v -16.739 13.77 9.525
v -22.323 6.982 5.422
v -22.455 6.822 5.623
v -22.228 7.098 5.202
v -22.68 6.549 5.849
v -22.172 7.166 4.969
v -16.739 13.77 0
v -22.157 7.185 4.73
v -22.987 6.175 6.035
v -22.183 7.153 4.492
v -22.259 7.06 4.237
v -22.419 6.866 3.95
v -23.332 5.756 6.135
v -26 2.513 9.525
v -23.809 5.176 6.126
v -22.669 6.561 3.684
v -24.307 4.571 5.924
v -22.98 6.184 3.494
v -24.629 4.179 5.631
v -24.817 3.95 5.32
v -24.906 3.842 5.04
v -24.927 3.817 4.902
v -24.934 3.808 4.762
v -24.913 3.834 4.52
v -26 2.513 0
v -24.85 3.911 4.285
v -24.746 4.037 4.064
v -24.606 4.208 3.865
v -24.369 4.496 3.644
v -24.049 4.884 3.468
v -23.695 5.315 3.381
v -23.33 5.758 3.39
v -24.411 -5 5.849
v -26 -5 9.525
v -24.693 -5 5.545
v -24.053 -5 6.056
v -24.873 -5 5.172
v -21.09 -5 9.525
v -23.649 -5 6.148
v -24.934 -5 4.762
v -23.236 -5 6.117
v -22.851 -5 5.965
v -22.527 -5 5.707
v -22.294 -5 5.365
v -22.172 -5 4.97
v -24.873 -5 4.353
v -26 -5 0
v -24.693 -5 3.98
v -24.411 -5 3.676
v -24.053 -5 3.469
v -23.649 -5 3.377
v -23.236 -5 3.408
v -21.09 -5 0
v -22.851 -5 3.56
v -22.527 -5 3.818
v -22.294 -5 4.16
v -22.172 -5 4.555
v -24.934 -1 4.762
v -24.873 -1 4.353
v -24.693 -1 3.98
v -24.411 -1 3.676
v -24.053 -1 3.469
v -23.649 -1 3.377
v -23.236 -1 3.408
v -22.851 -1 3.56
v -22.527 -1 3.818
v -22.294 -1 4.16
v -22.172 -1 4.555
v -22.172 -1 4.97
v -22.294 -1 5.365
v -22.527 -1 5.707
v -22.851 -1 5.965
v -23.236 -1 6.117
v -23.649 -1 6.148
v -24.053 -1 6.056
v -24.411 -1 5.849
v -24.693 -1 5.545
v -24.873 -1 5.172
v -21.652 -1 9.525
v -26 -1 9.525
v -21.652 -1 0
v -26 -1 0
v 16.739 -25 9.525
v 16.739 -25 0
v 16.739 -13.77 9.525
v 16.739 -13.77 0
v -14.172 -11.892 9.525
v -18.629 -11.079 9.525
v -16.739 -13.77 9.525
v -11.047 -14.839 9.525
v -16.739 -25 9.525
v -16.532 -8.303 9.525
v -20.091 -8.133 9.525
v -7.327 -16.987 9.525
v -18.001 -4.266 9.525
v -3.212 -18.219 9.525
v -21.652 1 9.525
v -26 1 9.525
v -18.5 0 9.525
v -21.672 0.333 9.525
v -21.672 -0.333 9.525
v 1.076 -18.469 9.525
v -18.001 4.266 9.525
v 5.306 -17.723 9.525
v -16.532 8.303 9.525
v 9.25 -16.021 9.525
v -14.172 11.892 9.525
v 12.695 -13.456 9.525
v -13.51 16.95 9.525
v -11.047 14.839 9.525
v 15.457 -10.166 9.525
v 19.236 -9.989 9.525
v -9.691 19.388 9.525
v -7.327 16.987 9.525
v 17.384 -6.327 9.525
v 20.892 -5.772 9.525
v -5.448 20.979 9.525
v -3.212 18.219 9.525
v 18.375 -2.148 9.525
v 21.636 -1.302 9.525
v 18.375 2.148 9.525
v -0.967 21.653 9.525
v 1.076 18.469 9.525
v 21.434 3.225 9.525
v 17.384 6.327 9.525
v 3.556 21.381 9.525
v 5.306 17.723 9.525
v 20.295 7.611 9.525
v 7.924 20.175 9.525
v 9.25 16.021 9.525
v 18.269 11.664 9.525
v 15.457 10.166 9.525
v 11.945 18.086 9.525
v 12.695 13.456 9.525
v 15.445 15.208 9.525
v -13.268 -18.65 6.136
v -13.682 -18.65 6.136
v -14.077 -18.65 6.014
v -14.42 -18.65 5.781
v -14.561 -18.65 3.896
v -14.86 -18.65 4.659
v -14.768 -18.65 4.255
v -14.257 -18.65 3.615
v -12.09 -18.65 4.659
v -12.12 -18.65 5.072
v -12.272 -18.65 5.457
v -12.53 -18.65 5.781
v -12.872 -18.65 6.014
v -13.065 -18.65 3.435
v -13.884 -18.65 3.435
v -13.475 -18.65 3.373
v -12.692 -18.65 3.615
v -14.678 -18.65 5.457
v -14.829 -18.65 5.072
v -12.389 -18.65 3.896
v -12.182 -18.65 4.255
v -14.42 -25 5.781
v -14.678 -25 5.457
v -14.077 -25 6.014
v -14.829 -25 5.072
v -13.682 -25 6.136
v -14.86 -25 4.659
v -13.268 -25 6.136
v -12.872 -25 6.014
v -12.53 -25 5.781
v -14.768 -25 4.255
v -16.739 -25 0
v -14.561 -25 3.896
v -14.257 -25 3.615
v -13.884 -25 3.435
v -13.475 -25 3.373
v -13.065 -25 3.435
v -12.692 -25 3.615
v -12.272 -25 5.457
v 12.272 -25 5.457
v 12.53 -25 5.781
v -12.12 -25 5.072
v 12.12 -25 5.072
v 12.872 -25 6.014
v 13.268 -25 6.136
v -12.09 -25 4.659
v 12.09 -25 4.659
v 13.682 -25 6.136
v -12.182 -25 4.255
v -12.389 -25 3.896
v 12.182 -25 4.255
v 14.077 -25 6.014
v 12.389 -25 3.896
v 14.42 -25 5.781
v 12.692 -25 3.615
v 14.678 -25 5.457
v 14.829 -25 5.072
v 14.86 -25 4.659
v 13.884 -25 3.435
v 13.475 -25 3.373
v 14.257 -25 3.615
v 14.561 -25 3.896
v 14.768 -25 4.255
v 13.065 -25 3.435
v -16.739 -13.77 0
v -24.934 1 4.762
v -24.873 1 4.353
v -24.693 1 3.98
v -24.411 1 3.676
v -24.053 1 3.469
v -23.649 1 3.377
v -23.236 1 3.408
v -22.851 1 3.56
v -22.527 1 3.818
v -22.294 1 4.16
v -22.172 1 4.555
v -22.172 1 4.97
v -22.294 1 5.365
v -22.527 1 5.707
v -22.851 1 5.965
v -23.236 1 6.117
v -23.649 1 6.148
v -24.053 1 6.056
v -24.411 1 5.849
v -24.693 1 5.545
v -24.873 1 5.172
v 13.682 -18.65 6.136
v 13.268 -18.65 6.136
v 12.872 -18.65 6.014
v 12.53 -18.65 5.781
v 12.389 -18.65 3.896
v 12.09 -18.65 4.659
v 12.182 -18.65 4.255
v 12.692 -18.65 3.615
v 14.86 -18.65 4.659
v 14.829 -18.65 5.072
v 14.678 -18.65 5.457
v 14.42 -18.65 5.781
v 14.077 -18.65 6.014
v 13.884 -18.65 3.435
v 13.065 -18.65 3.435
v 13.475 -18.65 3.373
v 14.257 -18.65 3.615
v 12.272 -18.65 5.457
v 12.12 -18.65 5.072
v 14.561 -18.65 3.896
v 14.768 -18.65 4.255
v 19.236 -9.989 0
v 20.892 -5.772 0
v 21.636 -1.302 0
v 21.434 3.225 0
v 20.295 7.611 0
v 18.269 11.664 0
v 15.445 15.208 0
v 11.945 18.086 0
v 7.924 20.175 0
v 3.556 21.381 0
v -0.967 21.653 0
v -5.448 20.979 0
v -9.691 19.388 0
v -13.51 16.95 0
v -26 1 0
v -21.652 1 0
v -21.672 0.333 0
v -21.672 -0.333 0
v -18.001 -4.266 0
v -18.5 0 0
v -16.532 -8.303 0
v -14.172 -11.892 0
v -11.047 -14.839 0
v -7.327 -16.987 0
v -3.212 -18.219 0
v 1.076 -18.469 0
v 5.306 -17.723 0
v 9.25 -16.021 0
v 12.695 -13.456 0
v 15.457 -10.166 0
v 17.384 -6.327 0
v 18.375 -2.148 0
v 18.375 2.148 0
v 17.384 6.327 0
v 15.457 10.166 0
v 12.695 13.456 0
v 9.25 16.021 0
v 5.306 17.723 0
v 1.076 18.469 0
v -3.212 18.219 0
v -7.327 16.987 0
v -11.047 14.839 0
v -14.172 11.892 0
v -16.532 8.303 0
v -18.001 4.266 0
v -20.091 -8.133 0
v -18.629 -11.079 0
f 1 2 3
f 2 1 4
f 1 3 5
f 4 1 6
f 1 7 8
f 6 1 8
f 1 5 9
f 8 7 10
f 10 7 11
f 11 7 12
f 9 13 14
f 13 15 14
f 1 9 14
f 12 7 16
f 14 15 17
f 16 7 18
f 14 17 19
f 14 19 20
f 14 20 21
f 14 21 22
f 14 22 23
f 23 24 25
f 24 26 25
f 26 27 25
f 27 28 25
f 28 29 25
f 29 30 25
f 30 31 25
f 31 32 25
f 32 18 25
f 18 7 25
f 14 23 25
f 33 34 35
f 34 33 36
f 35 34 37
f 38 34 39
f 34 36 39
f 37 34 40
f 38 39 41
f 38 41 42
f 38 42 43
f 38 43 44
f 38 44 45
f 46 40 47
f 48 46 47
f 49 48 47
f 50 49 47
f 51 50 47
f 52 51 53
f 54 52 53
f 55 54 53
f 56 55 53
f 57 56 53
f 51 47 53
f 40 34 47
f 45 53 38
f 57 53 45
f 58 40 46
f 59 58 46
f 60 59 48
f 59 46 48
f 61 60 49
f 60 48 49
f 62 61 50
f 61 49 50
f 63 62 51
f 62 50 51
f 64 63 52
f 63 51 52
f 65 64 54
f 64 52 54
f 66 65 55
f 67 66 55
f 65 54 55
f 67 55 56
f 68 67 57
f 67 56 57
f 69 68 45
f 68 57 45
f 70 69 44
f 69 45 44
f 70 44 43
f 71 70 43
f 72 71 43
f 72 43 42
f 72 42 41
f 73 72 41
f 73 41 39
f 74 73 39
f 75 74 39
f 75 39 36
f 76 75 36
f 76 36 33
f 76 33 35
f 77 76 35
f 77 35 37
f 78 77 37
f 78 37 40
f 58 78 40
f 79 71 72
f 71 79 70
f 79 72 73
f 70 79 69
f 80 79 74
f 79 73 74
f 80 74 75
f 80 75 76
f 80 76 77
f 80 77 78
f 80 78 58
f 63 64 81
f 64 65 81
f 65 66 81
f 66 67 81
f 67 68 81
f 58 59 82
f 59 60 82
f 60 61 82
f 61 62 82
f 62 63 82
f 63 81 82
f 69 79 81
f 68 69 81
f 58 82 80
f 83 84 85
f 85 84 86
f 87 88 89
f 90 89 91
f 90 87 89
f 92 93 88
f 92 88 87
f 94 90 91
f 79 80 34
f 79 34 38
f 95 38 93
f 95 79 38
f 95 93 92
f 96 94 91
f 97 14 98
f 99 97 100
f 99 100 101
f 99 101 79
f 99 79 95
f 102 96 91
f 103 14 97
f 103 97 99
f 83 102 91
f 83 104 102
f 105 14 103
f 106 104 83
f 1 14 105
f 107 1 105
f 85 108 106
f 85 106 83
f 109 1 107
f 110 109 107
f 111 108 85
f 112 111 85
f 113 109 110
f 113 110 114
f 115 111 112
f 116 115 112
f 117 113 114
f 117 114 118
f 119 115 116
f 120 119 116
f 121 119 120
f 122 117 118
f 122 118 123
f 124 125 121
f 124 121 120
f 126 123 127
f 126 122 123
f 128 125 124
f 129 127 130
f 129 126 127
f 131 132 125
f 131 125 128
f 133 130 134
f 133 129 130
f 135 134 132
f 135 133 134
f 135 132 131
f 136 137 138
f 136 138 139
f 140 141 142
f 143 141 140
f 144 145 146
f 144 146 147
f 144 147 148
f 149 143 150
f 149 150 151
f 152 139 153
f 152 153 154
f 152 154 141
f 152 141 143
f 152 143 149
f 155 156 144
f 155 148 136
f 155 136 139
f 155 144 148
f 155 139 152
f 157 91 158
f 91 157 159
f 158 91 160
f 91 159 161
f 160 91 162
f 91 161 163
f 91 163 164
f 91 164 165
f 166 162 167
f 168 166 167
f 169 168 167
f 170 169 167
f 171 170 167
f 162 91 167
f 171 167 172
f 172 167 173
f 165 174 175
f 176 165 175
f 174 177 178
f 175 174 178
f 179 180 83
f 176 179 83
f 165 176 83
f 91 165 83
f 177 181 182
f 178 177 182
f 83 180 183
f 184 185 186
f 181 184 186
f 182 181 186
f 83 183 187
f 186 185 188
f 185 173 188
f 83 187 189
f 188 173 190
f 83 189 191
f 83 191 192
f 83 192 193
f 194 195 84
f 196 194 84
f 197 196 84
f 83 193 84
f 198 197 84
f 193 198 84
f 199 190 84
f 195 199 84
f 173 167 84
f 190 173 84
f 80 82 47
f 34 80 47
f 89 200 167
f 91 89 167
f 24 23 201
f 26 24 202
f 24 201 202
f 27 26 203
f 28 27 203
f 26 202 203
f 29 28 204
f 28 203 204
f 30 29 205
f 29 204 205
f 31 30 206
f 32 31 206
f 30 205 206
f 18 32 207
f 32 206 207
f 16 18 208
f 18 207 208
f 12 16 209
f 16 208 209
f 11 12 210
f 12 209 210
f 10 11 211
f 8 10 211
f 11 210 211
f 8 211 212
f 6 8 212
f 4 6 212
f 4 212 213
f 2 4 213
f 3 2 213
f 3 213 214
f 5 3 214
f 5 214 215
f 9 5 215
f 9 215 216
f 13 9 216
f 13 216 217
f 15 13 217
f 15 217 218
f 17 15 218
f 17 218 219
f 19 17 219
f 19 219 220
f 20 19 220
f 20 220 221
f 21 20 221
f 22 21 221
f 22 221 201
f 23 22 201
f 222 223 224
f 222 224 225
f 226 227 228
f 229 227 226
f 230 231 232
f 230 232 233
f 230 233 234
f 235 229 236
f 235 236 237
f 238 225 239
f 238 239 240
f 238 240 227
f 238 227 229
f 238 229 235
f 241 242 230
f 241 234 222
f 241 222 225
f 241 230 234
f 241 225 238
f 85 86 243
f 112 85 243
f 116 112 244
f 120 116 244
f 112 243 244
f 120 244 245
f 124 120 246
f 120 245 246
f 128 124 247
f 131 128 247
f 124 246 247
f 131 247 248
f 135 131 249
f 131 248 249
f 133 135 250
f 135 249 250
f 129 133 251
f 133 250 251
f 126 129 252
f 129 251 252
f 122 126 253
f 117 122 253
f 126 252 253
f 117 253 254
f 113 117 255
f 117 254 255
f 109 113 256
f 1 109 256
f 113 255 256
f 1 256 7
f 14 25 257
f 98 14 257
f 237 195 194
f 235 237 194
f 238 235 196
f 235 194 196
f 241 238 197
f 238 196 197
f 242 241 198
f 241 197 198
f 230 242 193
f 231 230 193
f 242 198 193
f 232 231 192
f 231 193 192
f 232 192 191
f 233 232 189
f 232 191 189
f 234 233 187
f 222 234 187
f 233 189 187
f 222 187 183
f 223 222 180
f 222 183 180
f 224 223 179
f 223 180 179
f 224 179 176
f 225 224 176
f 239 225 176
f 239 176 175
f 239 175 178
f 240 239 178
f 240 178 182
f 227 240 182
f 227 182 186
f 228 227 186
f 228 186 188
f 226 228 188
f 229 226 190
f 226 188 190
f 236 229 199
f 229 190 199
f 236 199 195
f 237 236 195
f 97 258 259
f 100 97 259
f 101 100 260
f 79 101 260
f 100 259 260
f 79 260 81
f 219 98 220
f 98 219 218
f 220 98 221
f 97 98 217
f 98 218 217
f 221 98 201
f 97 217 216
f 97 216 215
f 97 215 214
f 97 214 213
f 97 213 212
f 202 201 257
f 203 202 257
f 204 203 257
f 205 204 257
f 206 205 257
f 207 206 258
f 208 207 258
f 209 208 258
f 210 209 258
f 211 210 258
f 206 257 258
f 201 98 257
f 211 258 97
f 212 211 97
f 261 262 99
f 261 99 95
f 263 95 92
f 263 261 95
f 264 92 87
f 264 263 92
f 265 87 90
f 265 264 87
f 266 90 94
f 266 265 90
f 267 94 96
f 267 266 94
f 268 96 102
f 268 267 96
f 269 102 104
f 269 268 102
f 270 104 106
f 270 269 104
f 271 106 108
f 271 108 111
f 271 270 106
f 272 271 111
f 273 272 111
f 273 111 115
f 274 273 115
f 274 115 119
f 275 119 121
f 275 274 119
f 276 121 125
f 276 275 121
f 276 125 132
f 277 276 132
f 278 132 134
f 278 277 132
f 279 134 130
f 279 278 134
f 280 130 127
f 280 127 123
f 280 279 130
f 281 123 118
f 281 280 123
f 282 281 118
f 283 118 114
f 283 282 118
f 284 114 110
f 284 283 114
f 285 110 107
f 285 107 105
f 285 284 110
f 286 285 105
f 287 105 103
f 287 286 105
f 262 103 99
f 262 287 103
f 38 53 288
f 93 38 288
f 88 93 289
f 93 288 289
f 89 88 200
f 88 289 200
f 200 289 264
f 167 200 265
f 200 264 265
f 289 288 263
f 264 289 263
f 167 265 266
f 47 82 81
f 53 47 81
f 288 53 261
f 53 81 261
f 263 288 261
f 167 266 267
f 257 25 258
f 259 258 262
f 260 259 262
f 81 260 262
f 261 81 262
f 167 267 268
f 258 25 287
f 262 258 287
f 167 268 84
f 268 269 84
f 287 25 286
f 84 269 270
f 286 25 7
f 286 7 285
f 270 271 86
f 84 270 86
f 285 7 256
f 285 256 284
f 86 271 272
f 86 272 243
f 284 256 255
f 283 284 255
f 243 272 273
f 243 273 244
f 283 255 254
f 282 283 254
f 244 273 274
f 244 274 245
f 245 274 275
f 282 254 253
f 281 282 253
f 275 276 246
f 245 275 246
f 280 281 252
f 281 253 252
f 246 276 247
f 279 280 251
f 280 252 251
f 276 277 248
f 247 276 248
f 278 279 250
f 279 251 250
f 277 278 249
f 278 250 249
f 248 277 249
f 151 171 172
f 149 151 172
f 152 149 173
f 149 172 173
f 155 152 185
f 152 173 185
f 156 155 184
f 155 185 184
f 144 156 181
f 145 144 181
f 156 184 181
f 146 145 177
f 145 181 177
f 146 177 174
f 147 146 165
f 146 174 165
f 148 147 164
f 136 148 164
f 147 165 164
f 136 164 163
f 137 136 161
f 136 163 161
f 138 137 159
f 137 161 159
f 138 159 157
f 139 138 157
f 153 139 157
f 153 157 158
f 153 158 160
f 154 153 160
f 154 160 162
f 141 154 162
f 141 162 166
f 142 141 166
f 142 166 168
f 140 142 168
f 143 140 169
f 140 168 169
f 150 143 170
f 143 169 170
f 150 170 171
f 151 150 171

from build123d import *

# Parameters (mm, degrees)
SKETCH1_R           = 18.5
BOSS_EXTRUDE1_DEPTH = 9.525
SKETCH2_R           = 1.3890625
CUT_EXTRUDE1_DEPTH  = 6.35
CUT_EXTRUDE2_REACH  = 40.448
SKETCH3_R           = 1.3890625


with BuildPart() as part:
    # Sketch1 → Boss-Extrude1 (new body)
    with BuildSketch(Plane.XY):
        with BuildLine():
            Line((-16.7386, 13.770435543), (-26, 2.512776367))
            Line((-26, 2.512776367), (-26, 1))
            Line((-26, 1), (-21.651919661, 1))
            ThreePointArc((-21.651919661, 1), (-21.675, 0), (-21.651919661, -1))
            Line((-21.651919661, -1), (-26, -1))
            Line((-26, -1), (-26, -5))
            Line((-26, -5), (-21.090415477, -5))
            ThreePointArc((-21.090415477, -5), (-19.416197823, -9.634152122), (-16.7386, -13.770435543))
            Line((-16.7386, -13.770435543), (-16.7386, -25))
            Line((-16.7386, -25), (16.7386, -25))
            Line((16.7386, -25), (16.7386, -13.770435543))
            ThreePointArc((16.7386, -13.770435543), (13.770435543, 16.7386), (-16.7386, 13.770435543))
        make_face()
        with Locations(Location((0, 0, 0), (0, 0, 180))):
            Circle(SKETCH1_R, mode=Mode.SUBTRACT)
    extrude(amount=BOSS_EXTRUDE1_DEPTH)

    # Sketch2 → Cut-Extrude1 (cut)
    with BuildSketch(Plane.XZ.offset(25)):
        with Locations(Location((-13.4747, 4.7625, 0), (0, 0, 270))):
            Circle(SKETCH2_R)
        with Locations(Location((13.4747, 4.7625, 0), (0, 0, 270))):
            Circle(SKETCH2_R)
    extrude(amount=-CUT_EXTRUDE1_DEPTH, mode=Mode.SUBTRACT)

    # Cut-Extrude2: up to this plane
    cut_extrude2_end = Plane(origin=(-16.7386, 13.770435543, 9.525), z_dir=(0.7722537485582471, -0.635314211896551, 0))
    # Sketch3 → Cut-Extrude2 (cut, up to the surface)
    with BuildSketch(Plane.XZ.offset(5), mode=Mode.PRIVATE) as cut_extrude2_sk1:
        with Locations(Location((-23.545207739, 4.7625, 0), (0, 0, 180))):
            Circle(SKETCH3_R)
    cut_extrude2_tool1 = split(extrude(cut_extrude2_sk1.sketch, amount=-CUT_EXTRUDE2_REACH, mode=Mode.PRIVATE), bisect_by=cut_extrude2_end, keep=Keep.BOTH, mode=Mode.PRIVATE)
    add(cut_extrude2_tool1.solids().sort_by_distance((-23.545208, -5, 4.7625))[0], mode=Mode.SUBTRACT)


solid = part.part
